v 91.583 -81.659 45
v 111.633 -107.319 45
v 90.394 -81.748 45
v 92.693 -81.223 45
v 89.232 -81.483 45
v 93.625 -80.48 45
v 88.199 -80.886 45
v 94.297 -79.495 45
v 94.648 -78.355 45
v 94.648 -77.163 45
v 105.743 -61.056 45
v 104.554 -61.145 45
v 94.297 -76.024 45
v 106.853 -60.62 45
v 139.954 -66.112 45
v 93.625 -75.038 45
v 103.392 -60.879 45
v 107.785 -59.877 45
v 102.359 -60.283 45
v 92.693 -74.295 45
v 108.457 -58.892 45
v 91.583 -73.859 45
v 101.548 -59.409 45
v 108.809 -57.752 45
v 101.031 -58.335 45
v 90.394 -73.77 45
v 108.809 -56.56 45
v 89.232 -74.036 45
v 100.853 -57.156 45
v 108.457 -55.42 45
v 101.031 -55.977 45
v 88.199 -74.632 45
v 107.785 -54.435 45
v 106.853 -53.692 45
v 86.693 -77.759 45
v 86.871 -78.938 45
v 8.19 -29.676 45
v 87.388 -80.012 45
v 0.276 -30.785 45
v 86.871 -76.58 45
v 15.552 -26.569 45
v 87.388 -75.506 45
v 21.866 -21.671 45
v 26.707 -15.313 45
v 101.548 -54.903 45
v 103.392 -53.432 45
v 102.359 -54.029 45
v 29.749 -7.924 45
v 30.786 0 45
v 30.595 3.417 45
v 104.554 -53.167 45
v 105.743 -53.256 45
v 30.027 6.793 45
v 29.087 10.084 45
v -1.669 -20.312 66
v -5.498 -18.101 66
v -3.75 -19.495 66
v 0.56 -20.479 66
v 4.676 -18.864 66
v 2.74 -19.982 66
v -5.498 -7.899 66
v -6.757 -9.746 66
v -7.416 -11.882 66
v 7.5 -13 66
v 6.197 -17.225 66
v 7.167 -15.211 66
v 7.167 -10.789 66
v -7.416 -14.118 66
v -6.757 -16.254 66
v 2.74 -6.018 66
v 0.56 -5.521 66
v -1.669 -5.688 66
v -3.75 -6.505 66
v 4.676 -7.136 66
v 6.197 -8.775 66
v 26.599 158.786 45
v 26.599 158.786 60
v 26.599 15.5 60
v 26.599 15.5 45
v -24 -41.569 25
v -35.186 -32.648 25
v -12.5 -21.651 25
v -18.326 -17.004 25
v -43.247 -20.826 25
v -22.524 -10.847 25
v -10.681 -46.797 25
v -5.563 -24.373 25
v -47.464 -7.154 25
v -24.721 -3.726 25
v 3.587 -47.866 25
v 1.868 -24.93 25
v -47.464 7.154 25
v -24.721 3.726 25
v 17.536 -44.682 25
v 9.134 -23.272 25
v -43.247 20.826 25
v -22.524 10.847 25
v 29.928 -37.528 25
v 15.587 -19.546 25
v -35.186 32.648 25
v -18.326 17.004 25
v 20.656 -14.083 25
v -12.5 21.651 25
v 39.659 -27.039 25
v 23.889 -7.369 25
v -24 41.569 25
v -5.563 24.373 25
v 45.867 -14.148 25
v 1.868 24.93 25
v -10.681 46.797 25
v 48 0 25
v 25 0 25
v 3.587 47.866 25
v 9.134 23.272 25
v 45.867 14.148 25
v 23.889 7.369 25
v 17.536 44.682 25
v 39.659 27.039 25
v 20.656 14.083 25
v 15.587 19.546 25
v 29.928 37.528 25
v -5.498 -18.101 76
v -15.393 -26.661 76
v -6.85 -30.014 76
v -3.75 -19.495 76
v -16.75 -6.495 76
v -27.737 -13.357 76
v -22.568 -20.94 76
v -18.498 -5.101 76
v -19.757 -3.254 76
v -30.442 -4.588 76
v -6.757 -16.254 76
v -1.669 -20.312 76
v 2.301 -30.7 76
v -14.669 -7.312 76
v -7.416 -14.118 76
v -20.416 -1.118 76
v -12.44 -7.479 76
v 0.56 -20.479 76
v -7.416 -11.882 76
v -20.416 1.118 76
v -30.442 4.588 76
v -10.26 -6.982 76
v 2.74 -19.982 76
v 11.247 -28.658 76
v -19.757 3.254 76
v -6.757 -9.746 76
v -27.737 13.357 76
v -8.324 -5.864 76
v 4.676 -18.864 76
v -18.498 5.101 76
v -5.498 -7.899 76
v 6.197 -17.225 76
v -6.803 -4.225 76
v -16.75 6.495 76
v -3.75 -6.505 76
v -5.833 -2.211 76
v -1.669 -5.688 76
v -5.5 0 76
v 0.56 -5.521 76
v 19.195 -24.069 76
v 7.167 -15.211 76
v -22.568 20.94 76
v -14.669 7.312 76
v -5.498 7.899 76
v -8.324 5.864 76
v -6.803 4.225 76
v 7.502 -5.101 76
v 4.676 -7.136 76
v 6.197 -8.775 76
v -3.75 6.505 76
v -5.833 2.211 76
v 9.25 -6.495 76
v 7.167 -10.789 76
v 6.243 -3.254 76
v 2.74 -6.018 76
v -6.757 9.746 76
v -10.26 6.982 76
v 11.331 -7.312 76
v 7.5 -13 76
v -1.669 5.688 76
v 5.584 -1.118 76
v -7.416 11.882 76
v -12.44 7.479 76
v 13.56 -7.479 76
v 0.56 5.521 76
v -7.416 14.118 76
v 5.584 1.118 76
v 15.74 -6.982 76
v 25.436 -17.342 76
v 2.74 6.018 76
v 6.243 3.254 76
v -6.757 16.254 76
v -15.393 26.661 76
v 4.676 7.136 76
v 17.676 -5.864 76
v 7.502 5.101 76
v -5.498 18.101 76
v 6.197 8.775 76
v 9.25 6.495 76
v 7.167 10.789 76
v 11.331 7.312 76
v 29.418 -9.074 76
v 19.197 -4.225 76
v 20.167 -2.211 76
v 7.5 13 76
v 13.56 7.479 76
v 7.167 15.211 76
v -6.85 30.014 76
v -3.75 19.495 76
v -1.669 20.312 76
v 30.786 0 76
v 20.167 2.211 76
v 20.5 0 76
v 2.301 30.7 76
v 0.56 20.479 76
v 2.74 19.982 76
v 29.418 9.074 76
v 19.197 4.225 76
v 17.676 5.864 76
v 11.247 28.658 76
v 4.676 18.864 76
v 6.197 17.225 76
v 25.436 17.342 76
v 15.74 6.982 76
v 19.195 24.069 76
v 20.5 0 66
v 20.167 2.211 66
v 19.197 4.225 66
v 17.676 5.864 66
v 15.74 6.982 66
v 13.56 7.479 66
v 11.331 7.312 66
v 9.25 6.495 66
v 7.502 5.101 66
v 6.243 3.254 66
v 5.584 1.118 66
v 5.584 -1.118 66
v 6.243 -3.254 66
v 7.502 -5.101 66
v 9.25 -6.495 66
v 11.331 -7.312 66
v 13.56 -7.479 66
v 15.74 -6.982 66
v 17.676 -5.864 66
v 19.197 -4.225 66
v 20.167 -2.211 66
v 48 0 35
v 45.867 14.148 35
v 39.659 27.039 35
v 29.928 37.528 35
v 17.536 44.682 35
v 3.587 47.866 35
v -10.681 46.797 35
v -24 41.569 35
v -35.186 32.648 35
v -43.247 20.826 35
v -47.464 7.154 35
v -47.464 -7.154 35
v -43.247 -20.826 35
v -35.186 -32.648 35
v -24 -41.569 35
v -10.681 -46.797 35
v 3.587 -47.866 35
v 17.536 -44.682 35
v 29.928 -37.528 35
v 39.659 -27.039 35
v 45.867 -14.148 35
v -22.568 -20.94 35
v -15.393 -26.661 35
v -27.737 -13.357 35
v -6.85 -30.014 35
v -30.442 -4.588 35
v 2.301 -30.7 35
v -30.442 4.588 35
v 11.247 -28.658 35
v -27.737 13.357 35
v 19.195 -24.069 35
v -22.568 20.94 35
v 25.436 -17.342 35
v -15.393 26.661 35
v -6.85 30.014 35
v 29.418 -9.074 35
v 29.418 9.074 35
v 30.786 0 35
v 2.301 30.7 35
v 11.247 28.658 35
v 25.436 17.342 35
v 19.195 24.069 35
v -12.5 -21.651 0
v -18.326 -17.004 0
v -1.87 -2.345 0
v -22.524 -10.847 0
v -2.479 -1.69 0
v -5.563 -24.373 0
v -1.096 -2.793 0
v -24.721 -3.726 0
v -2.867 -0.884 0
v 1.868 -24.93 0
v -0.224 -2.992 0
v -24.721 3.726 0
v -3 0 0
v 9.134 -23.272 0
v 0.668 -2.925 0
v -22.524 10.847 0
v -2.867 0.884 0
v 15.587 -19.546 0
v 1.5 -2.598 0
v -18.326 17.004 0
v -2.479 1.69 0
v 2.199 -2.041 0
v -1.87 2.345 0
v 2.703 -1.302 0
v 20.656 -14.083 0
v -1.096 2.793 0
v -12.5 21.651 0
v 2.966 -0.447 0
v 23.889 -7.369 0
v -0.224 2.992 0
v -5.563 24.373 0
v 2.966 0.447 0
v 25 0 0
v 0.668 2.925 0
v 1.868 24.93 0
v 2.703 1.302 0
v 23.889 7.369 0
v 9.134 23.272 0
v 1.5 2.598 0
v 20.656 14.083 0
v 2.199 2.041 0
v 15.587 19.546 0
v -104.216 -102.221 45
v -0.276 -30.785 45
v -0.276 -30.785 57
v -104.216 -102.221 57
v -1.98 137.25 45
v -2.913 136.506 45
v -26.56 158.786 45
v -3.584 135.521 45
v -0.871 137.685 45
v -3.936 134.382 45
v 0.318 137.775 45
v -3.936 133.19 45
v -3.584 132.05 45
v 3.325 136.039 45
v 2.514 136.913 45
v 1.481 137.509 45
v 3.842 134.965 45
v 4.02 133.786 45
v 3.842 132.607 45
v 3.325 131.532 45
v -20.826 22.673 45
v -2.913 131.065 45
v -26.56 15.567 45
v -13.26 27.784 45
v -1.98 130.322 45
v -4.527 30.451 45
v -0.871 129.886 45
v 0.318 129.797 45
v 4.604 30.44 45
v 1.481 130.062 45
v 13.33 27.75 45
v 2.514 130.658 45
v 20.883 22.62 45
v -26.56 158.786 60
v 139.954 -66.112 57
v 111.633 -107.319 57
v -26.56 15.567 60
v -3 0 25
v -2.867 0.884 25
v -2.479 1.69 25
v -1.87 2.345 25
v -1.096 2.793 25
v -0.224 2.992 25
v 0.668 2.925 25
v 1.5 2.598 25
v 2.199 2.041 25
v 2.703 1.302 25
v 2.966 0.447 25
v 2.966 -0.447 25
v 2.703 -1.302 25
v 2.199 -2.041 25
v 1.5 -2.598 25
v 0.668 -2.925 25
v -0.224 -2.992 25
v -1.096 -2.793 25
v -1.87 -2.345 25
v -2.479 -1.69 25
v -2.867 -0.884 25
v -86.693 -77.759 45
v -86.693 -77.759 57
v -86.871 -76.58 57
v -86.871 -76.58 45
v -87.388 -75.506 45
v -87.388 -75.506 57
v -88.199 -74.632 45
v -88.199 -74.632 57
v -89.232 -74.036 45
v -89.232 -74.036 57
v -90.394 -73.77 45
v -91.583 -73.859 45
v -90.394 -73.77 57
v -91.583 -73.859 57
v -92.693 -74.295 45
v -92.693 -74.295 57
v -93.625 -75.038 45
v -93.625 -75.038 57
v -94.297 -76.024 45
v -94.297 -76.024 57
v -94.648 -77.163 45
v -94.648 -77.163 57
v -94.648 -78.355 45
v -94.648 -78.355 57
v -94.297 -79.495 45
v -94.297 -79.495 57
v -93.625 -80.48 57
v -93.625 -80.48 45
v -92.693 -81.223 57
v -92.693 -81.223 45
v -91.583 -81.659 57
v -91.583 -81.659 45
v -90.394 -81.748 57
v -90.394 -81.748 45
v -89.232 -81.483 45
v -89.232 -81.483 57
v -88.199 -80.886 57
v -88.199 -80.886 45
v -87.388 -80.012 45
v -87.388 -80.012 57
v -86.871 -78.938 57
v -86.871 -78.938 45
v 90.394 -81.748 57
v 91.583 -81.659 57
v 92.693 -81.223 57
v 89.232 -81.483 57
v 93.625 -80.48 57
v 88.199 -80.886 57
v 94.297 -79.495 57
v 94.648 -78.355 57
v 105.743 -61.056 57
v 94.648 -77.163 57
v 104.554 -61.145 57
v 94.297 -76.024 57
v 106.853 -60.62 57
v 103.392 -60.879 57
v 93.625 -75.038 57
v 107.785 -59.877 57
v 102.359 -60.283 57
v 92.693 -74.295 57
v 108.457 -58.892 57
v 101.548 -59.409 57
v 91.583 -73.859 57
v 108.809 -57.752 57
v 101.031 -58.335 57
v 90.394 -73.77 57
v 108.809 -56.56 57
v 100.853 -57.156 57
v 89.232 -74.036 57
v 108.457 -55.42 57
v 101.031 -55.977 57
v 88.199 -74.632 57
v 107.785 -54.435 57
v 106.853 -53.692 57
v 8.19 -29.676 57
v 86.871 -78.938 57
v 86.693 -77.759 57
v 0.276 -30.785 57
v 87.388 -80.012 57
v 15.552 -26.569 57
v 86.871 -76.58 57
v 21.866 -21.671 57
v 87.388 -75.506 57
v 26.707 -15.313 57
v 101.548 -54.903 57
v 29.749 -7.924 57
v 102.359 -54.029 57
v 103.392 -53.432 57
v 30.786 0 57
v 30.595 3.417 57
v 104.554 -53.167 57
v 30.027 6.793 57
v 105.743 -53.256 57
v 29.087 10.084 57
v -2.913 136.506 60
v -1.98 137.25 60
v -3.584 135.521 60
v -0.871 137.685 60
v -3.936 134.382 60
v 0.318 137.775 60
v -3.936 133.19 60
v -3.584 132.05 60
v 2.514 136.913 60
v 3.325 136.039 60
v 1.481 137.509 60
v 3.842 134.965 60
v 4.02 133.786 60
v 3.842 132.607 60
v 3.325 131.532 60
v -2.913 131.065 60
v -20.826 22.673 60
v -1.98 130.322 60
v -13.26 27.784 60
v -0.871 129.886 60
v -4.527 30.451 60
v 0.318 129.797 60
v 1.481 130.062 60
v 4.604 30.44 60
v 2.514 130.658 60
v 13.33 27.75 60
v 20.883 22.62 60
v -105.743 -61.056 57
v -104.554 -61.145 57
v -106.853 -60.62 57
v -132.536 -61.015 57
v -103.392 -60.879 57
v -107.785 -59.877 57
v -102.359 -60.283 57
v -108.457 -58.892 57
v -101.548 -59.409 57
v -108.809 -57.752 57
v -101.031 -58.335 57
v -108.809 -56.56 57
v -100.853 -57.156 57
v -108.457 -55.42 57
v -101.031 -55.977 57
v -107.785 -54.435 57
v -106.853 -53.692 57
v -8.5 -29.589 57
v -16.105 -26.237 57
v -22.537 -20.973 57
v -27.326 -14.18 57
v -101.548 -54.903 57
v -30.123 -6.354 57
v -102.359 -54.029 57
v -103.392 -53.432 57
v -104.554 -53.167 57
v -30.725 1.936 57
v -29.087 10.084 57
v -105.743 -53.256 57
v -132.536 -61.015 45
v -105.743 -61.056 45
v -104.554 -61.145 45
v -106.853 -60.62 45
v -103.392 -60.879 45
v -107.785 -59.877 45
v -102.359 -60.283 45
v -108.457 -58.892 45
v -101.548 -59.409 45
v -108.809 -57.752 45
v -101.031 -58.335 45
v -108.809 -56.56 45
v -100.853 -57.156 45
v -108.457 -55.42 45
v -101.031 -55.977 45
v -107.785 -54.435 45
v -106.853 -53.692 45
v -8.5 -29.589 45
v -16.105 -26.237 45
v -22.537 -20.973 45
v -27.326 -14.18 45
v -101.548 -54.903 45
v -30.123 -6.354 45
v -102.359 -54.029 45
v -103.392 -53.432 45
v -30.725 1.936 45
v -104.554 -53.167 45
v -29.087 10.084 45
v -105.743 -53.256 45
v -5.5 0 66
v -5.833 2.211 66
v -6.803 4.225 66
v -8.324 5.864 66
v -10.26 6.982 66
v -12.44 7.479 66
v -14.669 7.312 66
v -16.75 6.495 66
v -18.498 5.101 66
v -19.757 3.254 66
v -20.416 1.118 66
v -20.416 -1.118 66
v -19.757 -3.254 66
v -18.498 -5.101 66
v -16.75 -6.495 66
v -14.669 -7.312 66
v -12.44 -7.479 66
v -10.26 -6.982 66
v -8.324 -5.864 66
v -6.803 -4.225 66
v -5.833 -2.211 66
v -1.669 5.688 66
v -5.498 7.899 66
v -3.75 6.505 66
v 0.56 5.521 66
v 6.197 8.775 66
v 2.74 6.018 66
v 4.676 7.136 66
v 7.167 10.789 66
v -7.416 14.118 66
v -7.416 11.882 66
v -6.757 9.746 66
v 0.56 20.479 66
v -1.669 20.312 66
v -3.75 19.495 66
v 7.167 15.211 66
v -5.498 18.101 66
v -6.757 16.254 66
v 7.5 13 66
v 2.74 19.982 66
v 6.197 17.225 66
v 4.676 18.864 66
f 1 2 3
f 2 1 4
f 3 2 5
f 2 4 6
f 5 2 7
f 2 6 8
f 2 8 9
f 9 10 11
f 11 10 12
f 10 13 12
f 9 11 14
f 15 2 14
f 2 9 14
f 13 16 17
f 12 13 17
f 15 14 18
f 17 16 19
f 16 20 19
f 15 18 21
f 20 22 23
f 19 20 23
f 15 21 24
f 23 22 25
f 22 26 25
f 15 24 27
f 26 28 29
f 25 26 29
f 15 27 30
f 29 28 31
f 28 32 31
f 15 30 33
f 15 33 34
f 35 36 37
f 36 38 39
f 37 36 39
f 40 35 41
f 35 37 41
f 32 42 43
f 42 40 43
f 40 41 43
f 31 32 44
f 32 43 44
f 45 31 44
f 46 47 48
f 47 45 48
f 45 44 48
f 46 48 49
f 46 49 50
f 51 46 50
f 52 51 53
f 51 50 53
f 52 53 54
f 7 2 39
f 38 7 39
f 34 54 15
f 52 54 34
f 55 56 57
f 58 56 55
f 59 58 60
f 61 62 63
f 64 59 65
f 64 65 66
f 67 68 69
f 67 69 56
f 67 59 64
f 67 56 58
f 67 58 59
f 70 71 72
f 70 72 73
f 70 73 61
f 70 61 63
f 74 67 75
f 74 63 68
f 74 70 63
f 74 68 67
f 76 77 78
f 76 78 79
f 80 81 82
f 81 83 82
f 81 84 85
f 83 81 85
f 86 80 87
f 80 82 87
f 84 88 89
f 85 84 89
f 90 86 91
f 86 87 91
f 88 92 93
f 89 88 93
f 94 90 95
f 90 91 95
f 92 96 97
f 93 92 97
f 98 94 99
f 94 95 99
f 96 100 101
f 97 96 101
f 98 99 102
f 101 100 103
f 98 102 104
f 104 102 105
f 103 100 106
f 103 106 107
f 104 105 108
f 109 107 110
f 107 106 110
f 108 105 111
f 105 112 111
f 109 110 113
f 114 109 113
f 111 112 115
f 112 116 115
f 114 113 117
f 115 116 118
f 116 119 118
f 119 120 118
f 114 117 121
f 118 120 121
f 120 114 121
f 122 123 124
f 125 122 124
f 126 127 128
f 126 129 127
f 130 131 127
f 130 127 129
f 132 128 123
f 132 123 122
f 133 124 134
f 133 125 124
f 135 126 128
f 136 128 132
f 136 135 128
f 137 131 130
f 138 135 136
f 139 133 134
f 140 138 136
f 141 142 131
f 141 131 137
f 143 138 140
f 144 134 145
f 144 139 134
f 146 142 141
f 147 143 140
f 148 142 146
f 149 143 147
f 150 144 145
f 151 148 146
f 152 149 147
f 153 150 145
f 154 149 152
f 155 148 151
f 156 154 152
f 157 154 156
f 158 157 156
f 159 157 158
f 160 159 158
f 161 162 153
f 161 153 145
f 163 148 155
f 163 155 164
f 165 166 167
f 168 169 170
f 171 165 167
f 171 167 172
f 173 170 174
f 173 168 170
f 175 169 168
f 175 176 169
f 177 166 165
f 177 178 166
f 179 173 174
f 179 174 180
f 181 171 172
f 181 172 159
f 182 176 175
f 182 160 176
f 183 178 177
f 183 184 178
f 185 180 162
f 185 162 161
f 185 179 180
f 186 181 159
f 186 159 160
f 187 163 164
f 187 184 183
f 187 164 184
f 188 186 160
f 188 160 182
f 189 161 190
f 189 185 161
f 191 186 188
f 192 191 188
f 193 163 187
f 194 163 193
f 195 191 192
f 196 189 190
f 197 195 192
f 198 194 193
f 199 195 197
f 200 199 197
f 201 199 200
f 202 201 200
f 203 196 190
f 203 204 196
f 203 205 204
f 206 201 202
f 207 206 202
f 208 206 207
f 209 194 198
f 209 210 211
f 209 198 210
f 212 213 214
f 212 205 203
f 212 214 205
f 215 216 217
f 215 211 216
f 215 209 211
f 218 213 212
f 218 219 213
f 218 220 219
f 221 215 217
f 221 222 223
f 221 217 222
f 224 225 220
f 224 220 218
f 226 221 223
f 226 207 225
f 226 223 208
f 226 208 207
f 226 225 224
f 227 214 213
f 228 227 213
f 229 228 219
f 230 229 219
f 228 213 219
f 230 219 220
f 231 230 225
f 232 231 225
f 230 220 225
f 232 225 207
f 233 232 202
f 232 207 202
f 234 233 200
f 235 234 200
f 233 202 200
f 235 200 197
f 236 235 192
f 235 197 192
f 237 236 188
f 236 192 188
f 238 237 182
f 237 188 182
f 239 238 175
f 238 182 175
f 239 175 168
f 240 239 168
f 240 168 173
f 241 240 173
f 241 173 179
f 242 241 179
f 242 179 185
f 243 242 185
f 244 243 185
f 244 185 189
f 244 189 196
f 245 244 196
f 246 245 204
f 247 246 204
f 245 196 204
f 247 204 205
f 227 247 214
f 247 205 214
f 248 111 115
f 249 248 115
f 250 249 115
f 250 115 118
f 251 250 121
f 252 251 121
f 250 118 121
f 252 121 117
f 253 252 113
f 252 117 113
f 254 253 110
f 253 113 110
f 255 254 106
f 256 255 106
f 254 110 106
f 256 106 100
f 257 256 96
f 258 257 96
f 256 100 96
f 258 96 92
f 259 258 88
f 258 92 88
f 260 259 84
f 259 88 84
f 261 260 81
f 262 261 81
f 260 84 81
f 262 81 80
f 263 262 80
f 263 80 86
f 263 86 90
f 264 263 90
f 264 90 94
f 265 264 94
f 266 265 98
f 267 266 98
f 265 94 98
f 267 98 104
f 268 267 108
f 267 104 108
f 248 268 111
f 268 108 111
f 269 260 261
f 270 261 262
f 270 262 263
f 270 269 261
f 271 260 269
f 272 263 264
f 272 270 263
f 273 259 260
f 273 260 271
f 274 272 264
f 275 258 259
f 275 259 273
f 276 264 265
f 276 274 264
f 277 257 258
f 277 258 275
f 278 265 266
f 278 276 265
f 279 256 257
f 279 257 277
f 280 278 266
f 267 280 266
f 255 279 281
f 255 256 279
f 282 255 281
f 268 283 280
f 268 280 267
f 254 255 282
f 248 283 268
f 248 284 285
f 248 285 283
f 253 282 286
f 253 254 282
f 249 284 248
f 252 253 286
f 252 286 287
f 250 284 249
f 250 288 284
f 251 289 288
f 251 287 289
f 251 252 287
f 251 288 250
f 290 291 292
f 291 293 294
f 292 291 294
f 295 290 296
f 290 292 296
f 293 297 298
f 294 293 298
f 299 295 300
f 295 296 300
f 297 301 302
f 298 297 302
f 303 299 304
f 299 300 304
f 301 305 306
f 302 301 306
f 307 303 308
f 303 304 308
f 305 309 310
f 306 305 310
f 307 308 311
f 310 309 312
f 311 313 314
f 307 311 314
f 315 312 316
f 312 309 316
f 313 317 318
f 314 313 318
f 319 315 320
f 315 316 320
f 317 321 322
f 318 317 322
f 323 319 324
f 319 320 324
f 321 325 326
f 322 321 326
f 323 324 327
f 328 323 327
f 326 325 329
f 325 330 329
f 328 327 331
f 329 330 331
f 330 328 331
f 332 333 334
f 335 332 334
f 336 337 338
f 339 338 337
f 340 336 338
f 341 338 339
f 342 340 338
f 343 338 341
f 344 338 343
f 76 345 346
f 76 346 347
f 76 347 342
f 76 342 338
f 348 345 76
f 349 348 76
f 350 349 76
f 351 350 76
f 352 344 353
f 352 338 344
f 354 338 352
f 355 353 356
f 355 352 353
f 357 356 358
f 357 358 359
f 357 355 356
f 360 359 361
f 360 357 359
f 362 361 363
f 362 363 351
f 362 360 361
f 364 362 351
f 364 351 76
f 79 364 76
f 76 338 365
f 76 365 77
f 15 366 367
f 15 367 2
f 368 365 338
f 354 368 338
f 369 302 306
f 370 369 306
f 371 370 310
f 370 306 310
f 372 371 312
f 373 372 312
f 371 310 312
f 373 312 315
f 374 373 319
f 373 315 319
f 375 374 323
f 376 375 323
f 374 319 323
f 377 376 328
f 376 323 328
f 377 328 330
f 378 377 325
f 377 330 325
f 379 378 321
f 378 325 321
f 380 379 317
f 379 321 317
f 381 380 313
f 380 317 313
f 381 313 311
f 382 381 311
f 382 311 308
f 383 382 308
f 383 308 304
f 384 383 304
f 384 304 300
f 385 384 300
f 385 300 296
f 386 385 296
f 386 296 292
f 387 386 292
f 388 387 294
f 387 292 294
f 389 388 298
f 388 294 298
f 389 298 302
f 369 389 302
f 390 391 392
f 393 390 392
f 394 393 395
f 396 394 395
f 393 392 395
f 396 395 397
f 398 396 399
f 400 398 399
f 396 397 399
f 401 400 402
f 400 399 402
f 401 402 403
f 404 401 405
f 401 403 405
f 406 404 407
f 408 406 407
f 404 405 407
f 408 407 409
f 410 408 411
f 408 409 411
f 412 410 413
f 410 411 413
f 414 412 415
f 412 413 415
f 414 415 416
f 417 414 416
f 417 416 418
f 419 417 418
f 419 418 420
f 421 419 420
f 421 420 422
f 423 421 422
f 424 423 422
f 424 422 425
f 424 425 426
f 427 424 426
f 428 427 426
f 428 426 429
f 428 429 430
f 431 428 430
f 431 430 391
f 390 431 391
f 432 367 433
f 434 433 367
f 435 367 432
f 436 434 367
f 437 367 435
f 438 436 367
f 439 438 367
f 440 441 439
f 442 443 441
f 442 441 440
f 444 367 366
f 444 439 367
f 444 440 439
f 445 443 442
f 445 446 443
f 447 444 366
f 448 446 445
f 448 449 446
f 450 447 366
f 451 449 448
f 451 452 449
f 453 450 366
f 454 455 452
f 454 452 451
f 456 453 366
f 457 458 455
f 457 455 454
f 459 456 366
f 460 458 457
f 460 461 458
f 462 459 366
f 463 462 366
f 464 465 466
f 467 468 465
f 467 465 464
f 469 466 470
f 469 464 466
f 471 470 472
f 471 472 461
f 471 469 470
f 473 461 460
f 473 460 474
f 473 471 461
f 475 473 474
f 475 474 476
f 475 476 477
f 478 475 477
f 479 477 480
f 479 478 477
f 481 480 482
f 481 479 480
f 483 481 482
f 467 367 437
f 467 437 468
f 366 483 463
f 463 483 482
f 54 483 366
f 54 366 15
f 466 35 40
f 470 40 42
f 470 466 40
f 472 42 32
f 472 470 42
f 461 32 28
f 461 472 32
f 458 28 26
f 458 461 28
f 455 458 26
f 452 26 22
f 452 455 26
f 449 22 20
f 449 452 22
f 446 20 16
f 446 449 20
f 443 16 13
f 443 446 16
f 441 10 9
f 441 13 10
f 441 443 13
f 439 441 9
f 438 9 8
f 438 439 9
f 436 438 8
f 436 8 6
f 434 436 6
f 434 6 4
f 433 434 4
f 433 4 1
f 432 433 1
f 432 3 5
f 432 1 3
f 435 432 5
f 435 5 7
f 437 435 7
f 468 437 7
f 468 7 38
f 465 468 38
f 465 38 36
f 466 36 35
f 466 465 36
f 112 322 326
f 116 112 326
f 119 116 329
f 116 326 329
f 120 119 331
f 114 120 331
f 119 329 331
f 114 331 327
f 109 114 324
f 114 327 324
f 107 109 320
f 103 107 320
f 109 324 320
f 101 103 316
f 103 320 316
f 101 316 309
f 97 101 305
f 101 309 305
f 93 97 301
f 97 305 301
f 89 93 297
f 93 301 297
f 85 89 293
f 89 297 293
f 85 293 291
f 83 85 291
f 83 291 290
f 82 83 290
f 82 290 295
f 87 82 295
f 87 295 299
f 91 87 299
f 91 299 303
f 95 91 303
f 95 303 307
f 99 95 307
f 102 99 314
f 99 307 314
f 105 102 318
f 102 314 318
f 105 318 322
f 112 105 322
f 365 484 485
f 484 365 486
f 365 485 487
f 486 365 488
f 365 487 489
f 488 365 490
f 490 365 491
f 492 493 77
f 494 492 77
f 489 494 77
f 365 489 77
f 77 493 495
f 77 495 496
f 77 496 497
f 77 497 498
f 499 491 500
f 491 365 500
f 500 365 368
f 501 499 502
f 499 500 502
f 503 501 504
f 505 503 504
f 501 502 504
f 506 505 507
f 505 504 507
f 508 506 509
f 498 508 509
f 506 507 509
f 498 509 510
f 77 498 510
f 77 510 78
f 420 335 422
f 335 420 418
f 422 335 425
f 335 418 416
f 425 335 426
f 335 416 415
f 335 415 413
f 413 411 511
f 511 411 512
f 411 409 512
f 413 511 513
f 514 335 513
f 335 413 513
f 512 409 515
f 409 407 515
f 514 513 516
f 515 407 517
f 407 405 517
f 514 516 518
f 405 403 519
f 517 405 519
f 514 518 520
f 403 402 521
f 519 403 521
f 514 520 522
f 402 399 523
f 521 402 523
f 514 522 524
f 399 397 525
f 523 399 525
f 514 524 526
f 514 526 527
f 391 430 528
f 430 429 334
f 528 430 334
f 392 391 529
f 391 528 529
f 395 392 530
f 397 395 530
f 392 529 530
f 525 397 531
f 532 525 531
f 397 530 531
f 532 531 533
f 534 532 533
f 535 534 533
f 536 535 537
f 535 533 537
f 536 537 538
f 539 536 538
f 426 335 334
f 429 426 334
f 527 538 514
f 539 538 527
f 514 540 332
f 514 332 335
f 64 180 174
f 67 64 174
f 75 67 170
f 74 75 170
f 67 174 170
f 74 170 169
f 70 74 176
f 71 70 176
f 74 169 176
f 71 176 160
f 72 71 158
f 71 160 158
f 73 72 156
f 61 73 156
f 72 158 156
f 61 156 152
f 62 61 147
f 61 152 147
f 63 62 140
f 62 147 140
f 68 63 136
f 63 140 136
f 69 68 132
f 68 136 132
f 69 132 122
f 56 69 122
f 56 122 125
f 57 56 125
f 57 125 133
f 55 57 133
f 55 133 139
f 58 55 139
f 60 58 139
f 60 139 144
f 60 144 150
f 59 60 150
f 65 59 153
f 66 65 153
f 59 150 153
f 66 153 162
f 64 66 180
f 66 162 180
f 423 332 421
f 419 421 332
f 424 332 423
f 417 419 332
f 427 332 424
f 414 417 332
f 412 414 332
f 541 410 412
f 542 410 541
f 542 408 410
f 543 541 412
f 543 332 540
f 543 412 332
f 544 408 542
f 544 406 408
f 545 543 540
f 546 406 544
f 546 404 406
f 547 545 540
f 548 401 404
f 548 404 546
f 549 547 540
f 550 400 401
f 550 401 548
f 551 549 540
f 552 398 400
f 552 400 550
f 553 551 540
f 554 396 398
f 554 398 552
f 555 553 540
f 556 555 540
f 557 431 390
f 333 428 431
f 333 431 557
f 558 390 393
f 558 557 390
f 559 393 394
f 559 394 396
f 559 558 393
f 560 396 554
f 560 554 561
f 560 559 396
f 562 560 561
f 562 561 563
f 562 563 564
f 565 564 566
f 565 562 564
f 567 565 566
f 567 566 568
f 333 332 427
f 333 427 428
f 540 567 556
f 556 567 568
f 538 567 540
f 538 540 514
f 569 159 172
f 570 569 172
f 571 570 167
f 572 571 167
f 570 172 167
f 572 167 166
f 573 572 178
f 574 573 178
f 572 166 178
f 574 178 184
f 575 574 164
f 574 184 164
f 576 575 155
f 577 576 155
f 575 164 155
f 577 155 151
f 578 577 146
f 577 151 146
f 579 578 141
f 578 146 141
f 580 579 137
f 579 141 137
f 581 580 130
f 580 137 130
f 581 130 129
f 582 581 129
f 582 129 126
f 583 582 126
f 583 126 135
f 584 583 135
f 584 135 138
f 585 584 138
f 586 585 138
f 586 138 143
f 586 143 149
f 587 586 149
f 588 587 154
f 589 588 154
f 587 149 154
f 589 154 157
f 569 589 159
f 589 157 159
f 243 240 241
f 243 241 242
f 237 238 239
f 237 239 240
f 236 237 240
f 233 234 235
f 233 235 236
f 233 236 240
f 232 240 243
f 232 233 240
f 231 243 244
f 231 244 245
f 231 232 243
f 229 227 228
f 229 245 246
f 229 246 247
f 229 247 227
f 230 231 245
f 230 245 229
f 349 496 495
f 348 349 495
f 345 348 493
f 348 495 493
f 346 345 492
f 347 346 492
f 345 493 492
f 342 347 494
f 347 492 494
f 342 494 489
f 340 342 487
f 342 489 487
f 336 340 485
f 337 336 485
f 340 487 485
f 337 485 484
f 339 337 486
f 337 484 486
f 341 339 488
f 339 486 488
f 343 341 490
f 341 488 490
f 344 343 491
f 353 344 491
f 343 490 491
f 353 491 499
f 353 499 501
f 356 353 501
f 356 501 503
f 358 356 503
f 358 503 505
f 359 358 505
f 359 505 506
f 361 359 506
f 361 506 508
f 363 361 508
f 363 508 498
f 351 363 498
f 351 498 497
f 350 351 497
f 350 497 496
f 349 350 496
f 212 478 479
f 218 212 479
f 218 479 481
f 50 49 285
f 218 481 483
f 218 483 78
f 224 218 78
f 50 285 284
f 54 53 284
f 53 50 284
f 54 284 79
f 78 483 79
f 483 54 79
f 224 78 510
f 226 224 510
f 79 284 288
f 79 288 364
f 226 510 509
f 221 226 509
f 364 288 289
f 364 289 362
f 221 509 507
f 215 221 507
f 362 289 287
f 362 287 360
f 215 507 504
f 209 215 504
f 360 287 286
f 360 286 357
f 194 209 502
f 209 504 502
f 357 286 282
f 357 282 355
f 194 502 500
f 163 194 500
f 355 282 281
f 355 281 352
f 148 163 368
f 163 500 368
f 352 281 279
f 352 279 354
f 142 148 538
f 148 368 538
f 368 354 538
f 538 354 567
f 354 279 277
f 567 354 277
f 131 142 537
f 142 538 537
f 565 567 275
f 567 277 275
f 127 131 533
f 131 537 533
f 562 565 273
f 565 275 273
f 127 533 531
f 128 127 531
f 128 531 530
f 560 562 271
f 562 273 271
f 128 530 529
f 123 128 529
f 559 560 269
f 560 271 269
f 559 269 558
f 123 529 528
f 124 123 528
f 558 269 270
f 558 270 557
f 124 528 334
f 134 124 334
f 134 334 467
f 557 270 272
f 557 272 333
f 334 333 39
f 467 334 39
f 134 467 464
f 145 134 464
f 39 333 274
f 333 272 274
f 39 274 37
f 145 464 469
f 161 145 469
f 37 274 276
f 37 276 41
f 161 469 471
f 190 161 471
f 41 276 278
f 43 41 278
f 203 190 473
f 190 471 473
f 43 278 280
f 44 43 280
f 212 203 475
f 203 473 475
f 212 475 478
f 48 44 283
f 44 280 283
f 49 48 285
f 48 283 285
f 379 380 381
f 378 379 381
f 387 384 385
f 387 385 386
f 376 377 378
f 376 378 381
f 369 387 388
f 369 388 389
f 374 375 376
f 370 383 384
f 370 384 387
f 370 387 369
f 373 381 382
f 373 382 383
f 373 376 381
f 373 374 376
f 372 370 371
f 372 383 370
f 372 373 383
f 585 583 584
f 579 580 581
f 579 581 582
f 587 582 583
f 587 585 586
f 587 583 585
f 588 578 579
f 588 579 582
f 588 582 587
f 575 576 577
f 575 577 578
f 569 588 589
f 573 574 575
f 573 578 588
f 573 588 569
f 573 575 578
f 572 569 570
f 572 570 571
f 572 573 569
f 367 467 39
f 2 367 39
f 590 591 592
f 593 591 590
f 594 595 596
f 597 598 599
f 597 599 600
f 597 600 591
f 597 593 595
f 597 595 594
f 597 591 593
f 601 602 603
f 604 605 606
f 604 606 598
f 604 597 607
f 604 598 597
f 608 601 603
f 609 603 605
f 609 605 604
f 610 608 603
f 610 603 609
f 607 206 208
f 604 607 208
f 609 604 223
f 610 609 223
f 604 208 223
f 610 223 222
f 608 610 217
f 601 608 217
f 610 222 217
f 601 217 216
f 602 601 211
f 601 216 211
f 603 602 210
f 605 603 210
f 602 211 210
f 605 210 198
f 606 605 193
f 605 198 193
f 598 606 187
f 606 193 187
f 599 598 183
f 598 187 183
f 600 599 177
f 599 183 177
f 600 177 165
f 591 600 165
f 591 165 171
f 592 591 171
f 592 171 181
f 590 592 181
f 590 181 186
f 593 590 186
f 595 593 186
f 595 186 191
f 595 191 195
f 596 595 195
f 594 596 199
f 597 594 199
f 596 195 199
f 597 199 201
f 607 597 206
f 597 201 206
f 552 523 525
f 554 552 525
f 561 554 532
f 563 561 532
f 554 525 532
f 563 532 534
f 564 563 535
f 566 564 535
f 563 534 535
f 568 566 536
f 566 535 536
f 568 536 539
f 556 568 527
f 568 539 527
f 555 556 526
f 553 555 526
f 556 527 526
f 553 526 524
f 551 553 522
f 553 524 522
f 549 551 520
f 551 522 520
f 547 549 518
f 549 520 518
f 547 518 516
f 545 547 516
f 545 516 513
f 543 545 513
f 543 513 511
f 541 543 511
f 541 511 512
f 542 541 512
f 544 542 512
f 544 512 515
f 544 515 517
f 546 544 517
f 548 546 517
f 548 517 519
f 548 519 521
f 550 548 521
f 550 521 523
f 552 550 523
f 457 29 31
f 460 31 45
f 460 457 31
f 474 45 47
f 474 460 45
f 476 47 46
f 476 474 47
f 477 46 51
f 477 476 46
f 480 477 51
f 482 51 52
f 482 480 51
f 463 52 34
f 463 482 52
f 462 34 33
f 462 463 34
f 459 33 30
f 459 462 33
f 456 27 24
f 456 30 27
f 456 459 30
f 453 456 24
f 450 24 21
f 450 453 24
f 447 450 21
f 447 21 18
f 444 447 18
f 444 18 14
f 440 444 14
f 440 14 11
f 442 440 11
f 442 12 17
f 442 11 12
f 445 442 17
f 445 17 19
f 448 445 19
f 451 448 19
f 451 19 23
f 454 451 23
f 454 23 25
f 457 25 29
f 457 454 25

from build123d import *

# Parameters (mm, degrees)
SKETCH1_R                = 25
BOSS_EXTRUDE1_DEPTH      = 25
SKETCH2_R                = 48
BOSS_EXTRUDE2_DEPTH      = 10
SKETCH3_R                = 30.78576119
BOSS_EXTRUDE3_DEPTH      = 41
BOSS_EXTRUDE4_DEPTH      = 113
BOSS_EXTRUDE4_DEPTH_BACK = 31
SKETCH5_W                = 12
SKETCH5_H                = 50
BOSS_EXTRUDE5_DEPTH      = 122
BOSS_EXTRUDE5_DEPTH_BACK = 21
SKETCH6_W                = 12
SKETCH6_H                = 50
SKETCH7_R                = 3
CUT_EXTRUDE1_DEPTH       = 25
BOSS_EXTRUDE6_DEPTH      = 128
BOSS_EXTRUDE6_DEPTH_BACK = 16
SKETCH9_W                = 53.159298554
SKETCH9_H                = 15
SKETCH8_R                = 7.5
CUT_EXTRUDE2_DEPTH       = 10
SKETCH10_R               = 4
CUT_EXTRUDE3_DEPTH       = 72
SKETCH11_R               = 4
CUT_EXTRUDE4_DEPTH       = 72


with BuildPart() as part:
    # Sketch1 → Boss-Extrude1 (new body)
    with BuildSketch(Plane.XY):
        Circle(SKETCH1_R)
    extrude(amount=BOSS_EXTRUDE1_DEPTH)

    # Sketch2 → Boss-Extrude2 (add)
    with BuildSketch(Plane.XY.offset(25)):
        Circle(SKETCH2_R)
    extrude(amount=BOSS_EXTRUDE2_DEPTH)

    # Sketch3 → Boss-Extrude3 (add)
    with BuildSketch(Plane.XY.offset(35)):
        Circle(SKETCH3_R)
    extrude(amount=BOSS_EXTRUDE3_DEPTH)

    # Sketch5 → Boss-Extrude4 (add, two sides: drawn at the far end of the back side and taken through both)
    with BuildSketch(Plane(origin=(-25.371352033, -17.437247146, 0), x_dir=(0, 0, 1), z_dir=(-0.8241261886220168, -0.5664062369248312, 0)).offset(-BOSS_EXTRUDE4_DEPTH_BACK)):
        with Locations((51, -0.21423881)):
            Rectangle(SKETCH5_W, SKETCH5_H)
    extrude(amount=BOSS_EXTRUDE4_DEPTH + BOSS_EXTRUDE4_DEPTH_BACK)

    # Sketch6 → Boss-Extrude5 (add, two sides: drawn at the far end of the back side and taken through both)
    with BuildSketch(Plane(origin=(25.371352033, -17.437247146, 0), x_dir=(0, 0, -1), z_dir=(0.8241261886220168, -0.5664062369248313, 0)).offset(-BOSS_EXTRUDE5_DEPTH_BACK)):
        with Locations((-51, -0.21423881)):
            Rectangle(SKETCH6_W, SKETCH6_H)
    extrude(amount=BOSS_EXTRUDE5_DEPTH + BOSS_EXTRUDE5_DEPTH_BACK)

    # Sketch7 → Cut-Extrude1 (cut)
    with BuildSketch(Plane(origin=(0, 0, 0), x_dir=(-1, 0, 0), z_dir=(0, 0, -1))):
        Circle(SKETCH7_R)
    extrude(amount=-CUT_EXTRUDE1_DEPTH, mode=Mode.SUBTRACT)

    # Sketch9 → Boss-Extrude6 (add, two sides: drawn at the far end of the back side and taken through both)
    with BuildSketch(Plane(origin=(0, 30.78576119, 0), x_dir=(1, 0, 0), z_dir=(0, 1, 0)).offset(-BOSS_EXTRUDE6_DEPTH_BACK)):
        with Locations((0.01957738, -52.5)):
            Rectangle(SKETCH9_W, SKETCH9_H)
    extrude(amount=BOSS_EXTRUDE6_DEPTH + BOSS_EXTRUDE6_DEPTH_BACK)

    # Sketch8 → Cut-Extrude2 (cut)
    with BuildSketch(Plane.XY.offset(76)):
        with Locations((-13, 0)):
            Circle(SKETCH8_R)
        with Locations((13, 0)):
            Circle(SKETCH8_R)
        with Locations((0, 13)):
            Circle(SKETCH8_R)
        with Locations((0, -13)):
            Circle(SKETCH8_R)
    extrude(amount=-CUT_EXTRUDE2_DEPTH, mode=Mode.SUBTRACT)

    # Sketch10 → Cut-Extrude3 (cut)
    with BuildSketch(Plane.XY.offset(57)):
        with Locations((-104.853188395, -57.155978452)):
            Circle(SKETCH10_R)
        with Locations((-90.693032472, -77.759133168)):
            Circle(SKETCH10_R)
    cut_extrude3 = extrude(amount=-CUT_EXTRUDE3_DEPTH, mode=Mode.SUBTRACT)

    # Mirror1: Cut-Extrude3 across plane
    add(cut_extrude3.mirror(Plane.ZY), mode=Mode.SUBTRACT)

    # Sketch11 → Cut-Extrude4 (cut)
    with BuildSketch(Plane.XY.offset(60)):
        with Locations((0.01957738, 133.78576119)):
            Circle(SKETCH11_R)
    extrude(amount=-CUT_EXTRUDE4_DEPTH, mode=Mode.SUBTRACT)


solid = part.part
